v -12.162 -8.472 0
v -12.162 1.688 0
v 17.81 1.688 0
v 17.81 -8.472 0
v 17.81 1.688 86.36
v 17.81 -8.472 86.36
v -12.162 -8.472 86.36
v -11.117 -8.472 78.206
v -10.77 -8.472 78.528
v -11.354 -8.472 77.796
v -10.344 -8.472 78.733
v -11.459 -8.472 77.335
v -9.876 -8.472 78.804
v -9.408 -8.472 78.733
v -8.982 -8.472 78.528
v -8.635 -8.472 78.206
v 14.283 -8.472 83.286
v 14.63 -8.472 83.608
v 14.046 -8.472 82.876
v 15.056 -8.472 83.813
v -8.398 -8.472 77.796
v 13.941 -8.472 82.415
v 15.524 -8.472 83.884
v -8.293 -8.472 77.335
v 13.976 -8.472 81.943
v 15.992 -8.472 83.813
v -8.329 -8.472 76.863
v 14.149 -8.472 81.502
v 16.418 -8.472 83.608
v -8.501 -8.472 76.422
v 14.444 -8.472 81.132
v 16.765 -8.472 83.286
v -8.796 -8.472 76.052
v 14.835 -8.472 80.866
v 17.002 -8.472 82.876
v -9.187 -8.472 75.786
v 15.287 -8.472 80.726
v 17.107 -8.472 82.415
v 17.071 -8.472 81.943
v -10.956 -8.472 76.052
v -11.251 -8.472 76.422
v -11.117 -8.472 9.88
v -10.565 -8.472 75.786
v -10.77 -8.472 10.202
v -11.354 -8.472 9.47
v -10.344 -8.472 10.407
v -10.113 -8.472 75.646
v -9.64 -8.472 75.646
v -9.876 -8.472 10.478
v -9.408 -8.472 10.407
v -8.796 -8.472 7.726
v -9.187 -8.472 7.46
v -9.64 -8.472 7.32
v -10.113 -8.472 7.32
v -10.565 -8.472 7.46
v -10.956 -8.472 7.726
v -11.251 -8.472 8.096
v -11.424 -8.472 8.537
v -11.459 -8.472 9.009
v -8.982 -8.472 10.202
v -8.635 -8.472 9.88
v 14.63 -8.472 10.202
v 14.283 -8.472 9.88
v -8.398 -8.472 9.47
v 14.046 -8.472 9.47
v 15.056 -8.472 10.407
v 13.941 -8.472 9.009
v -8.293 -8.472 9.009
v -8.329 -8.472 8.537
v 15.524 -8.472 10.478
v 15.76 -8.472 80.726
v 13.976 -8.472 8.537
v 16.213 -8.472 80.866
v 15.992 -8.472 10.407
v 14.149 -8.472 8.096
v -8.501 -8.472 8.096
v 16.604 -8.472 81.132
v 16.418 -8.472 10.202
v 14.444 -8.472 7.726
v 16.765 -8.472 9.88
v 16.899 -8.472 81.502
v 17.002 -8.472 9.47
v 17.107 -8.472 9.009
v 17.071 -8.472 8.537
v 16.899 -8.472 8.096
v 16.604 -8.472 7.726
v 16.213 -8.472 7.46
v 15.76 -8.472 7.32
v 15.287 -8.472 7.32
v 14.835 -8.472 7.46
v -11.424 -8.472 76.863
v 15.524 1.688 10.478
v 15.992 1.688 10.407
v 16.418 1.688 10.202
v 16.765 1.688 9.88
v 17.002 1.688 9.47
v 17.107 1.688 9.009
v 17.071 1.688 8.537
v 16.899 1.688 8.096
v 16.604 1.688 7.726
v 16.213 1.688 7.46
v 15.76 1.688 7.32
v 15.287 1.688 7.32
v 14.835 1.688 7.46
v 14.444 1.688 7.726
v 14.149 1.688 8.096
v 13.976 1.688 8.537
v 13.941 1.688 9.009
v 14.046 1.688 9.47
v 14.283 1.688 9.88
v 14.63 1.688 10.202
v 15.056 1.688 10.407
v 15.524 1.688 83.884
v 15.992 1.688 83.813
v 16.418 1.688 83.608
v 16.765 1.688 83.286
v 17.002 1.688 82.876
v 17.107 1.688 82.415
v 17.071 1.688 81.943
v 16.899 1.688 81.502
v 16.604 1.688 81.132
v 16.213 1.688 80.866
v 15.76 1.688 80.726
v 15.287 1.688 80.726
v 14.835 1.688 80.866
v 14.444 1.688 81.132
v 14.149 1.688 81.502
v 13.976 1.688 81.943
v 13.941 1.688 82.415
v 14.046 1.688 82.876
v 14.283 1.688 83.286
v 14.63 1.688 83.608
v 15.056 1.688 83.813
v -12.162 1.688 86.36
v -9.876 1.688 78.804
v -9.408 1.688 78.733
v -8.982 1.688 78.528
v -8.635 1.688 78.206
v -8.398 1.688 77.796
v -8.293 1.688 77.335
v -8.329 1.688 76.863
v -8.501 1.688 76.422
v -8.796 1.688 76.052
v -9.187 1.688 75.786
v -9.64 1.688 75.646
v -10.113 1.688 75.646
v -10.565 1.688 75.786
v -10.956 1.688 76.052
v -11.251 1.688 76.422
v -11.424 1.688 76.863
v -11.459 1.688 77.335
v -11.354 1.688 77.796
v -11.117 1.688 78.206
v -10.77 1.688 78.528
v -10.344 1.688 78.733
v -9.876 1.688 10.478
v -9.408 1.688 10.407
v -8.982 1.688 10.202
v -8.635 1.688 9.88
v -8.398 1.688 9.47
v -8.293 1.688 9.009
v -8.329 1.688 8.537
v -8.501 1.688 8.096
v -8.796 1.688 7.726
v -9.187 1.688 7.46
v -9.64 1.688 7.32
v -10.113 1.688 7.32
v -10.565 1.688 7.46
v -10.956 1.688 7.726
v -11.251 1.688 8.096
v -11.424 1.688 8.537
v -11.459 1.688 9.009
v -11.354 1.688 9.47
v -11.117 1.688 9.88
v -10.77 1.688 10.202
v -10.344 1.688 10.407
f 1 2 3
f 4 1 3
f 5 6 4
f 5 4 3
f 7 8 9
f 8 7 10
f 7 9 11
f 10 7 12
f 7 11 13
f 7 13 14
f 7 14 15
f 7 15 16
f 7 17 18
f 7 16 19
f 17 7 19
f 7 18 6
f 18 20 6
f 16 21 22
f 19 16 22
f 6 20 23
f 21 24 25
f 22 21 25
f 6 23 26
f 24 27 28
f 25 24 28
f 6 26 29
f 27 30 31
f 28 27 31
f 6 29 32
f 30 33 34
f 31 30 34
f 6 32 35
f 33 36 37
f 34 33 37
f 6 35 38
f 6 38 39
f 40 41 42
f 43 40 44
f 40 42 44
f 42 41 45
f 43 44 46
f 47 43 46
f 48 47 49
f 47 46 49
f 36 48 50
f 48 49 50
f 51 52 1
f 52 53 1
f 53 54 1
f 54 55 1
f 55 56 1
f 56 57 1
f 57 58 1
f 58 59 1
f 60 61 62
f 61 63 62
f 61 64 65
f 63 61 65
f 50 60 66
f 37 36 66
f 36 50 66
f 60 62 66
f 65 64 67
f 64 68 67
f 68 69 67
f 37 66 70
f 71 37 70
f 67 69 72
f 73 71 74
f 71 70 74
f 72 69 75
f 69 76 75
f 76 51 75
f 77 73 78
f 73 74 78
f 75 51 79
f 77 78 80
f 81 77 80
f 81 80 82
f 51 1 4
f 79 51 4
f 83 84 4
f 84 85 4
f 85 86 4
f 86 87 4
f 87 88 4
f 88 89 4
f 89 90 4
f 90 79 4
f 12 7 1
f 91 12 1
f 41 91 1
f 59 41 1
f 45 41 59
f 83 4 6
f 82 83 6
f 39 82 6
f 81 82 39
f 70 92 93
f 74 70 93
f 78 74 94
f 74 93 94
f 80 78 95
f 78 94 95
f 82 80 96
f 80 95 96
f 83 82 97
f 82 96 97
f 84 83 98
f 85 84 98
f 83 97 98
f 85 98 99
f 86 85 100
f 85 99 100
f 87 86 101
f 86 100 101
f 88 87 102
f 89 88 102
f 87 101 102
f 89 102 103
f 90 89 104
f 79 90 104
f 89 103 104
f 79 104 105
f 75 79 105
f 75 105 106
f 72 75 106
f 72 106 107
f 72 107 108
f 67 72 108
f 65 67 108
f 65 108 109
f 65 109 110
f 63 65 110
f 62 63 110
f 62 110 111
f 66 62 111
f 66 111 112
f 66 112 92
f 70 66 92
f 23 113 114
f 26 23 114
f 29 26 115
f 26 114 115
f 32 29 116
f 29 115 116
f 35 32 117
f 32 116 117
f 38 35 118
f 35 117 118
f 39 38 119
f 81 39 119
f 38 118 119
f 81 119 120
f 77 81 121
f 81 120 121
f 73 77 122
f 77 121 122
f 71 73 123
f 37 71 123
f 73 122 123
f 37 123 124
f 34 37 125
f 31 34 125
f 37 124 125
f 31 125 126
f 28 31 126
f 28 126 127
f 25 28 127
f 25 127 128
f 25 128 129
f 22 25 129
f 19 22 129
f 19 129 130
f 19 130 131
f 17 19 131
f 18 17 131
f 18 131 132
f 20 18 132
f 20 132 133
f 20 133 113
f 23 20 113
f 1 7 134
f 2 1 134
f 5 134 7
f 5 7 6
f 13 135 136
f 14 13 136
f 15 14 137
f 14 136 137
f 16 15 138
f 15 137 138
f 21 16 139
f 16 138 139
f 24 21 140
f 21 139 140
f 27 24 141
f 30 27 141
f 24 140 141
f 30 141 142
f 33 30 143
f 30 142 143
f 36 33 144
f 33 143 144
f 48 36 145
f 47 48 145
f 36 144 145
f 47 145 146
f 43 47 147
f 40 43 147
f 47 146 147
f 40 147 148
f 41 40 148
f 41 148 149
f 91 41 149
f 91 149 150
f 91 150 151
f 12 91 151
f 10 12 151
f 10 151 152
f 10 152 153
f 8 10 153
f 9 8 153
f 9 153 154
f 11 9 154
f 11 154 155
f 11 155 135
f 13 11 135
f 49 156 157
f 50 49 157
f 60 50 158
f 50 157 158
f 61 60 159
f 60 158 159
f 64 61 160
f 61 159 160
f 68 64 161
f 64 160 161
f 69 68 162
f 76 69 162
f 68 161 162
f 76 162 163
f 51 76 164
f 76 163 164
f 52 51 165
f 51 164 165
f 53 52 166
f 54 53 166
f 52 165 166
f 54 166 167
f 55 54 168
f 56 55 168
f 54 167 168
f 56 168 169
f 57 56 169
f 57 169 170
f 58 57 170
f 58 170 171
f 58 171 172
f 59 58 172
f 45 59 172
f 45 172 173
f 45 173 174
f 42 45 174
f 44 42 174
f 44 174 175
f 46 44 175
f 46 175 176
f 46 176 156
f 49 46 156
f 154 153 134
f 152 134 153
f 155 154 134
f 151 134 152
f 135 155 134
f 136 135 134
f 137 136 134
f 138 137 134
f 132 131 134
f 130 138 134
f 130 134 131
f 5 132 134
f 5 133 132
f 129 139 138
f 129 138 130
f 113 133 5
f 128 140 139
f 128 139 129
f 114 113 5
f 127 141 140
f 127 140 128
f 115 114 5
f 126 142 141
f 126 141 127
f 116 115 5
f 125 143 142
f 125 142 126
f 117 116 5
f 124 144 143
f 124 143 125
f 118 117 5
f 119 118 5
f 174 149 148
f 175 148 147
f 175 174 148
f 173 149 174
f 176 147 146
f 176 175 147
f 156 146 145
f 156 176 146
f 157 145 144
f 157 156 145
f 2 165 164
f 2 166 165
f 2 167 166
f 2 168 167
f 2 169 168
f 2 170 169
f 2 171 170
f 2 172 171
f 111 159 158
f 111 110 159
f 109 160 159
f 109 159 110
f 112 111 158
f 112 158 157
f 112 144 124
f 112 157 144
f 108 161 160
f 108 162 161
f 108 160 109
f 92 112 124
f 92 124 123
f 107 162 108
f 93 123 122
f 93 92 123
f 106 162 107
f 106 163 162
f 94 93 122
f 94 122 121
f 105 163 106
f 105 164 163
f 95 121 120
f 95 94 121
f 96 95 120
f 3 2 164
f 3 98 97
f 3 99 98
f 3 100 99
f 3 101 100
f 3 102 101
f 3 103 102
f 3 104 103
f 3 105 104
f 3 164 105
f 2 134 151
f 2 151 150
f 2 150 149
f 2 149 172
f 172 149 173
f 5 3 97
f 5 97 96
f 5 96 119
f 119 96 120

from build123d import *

# Parameters (mm, degrees)
SKETCH1_W           = 29.972
SKETCH1_H           = 10.16
BOSS_EXTRUDE1_DEPTH = 86.36
SKETCH2_R           = 1.5875
CUT_EXTRUDE1_DEPTH  = 12.7


with BuildPart() as part:
    # Sketch1 → Boss-Extrude1 (new body)
    with BuildSketch(Plane.XY):
        with Locations((2.823785016, -3.39218241)):
            Rectangle(SKETCH1_W, SKETCH1_H)
    extrude(amount=BOSS_EXTRUDE1_DEPTH)

    # Sketch2 → Cut-Extrude1 (cut)
    with BuildSketch(Plane(origin=(0, 1.68781759, 0), x_dir=(1, 0, 0), z_dir=(0, 1, 0))):
        with Locations((-9.876214984, -8.89)):
            Circle(SKETCH2_R)
        with Locations((15.523785016, -8.89)):
            Circle(SKETCH2_R)
        with Locations((-9.876214984, -77.216)):
            Circle(SKETCH2_R)
        with Locations((15.523785016, -82.296)):
            Circle(SKETCH2_R)
    extrude(amount=-CUT_EXTRUDE1_DEPTH, mode=Mode.SUBTRACT)


solid = part.part
